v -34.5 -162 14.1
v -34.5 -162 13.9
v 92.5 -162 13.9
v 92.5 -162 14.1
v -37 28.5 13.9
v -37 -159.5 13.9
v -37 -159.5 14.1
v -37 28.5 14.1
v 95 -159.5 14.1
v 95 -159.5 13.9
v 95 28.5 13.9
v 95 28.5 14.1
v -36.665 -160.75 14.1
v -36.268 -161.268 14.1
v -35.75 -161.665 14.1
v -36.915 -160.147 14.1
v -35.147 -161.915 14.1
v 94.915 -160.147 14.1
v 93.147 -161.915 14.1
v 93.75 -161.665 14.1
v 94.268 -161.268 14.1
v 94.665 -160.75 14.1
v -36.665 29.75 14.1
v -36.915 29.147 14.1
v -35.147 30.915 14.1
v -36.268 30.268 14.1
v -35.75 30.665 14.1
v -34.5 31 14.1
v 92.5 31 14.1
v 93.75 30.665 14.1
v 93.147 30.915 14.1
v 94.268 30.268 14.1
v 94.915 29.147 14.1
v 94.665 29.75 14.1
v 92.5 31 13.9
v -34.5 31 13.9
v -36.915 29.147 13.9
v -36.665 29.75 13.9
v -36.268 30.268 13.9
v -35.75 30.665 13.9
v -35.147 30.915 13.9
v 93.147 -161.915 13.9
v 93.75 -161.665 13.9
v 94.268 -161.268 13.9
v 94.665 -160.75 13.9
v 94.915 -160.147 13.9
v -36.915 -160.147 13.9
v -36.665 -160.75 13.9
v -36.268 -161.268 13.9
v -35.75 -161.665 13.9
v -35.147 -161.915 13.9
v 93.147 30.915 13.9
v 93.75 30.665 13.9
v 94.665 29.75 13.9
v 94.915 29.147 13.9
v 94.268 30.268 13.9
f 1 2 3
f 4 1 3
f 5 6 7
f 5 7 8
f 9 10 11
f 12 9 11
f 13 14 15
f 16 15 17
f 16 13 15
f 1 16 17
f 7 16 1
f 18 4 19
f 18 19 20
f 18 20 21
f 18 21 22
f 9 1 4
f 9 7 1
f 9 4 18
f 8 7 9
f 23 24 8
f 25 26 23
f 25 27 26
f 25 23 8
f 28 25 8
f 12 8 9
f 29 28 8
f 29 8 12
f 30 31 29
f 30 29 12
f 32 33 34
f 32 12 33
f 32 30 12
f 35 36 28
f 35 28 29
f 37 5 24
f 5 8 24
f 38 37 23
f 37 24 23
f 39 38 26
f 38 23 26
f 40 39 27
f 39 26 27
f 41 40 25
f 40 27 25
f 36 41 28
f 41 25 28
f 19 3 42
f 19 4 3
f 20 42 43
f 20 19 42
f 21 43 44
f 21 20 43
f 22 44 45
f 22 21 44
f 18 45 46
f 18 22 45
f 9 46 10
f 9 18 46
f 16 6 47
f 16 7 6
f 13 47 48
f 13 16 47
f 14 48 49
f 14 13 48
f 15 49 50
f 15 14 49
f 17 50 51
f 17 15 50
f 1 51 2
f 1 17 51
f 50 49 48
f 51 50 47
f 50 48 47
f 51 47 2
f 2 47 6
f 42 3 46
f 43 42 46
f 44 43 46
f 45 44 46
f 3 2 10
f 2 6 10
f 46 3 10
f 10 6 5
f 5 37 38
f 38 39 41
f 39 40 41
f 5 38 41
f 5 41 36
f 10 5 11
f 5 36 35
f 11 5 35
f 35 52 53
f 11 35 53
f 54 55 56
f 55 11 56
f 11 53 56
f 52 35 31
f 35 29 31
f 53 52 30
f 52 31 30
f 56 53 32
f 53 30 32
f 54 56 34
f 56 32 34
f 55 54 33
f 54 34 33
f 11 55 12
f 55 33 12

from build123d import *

# Parameters (mm, degrees)
BOX003_W     = 132
BOX003_H     = 193
BOX003_DEPTH = 0.2
FILLET001_R  = 2.5
FILLET002_R  = 2.5
FILLET003_R  = 2.5
FILLET004_R  = 2.5


with BuildPart() as part:
    # Box003 → Box003 (new body)
    with BuildSketch(Plane(origin=(-37, -162, 13.9), x_dir=(1, 0, 0), z_dir=(0, 0, 1))):
        with Locations((66, 96.5)):
            Rectangle(BOX003_W, BOX003_H)
    extrude(amount=BOX003_DEPTH)

    # Fillet001
    fillet001_edges = [part.edges().sort_by_distance(p)[0] for p in [
        (-37, 31, 14),
    ]]
    fillet(fillet001_edges, radius=FILLET001_R)

    # Fillet002
    fillet002_edges = [part.edges().sort_by_distance(p)[0] for p in [
        (95, 31, 14),
    ]]
    fillet(fillet002_edges, radius=FILLET002_R)

    # Fillet003
    fillet003_edges = [part.edges().sort_by_distance(p)[0] for p in [
        (-37, -162, 14),
    ]]
    fillet(fillet003_edges, radius=FILLET003_R)

    # Fillet004
    fillet004_edges = [part.edges().sort_by_distance(p)[0] for p in [
        (95, -162, 14),
    ]]
    fillet(fillet004_edges, radius=FILLET004_R)


solid = part.part
